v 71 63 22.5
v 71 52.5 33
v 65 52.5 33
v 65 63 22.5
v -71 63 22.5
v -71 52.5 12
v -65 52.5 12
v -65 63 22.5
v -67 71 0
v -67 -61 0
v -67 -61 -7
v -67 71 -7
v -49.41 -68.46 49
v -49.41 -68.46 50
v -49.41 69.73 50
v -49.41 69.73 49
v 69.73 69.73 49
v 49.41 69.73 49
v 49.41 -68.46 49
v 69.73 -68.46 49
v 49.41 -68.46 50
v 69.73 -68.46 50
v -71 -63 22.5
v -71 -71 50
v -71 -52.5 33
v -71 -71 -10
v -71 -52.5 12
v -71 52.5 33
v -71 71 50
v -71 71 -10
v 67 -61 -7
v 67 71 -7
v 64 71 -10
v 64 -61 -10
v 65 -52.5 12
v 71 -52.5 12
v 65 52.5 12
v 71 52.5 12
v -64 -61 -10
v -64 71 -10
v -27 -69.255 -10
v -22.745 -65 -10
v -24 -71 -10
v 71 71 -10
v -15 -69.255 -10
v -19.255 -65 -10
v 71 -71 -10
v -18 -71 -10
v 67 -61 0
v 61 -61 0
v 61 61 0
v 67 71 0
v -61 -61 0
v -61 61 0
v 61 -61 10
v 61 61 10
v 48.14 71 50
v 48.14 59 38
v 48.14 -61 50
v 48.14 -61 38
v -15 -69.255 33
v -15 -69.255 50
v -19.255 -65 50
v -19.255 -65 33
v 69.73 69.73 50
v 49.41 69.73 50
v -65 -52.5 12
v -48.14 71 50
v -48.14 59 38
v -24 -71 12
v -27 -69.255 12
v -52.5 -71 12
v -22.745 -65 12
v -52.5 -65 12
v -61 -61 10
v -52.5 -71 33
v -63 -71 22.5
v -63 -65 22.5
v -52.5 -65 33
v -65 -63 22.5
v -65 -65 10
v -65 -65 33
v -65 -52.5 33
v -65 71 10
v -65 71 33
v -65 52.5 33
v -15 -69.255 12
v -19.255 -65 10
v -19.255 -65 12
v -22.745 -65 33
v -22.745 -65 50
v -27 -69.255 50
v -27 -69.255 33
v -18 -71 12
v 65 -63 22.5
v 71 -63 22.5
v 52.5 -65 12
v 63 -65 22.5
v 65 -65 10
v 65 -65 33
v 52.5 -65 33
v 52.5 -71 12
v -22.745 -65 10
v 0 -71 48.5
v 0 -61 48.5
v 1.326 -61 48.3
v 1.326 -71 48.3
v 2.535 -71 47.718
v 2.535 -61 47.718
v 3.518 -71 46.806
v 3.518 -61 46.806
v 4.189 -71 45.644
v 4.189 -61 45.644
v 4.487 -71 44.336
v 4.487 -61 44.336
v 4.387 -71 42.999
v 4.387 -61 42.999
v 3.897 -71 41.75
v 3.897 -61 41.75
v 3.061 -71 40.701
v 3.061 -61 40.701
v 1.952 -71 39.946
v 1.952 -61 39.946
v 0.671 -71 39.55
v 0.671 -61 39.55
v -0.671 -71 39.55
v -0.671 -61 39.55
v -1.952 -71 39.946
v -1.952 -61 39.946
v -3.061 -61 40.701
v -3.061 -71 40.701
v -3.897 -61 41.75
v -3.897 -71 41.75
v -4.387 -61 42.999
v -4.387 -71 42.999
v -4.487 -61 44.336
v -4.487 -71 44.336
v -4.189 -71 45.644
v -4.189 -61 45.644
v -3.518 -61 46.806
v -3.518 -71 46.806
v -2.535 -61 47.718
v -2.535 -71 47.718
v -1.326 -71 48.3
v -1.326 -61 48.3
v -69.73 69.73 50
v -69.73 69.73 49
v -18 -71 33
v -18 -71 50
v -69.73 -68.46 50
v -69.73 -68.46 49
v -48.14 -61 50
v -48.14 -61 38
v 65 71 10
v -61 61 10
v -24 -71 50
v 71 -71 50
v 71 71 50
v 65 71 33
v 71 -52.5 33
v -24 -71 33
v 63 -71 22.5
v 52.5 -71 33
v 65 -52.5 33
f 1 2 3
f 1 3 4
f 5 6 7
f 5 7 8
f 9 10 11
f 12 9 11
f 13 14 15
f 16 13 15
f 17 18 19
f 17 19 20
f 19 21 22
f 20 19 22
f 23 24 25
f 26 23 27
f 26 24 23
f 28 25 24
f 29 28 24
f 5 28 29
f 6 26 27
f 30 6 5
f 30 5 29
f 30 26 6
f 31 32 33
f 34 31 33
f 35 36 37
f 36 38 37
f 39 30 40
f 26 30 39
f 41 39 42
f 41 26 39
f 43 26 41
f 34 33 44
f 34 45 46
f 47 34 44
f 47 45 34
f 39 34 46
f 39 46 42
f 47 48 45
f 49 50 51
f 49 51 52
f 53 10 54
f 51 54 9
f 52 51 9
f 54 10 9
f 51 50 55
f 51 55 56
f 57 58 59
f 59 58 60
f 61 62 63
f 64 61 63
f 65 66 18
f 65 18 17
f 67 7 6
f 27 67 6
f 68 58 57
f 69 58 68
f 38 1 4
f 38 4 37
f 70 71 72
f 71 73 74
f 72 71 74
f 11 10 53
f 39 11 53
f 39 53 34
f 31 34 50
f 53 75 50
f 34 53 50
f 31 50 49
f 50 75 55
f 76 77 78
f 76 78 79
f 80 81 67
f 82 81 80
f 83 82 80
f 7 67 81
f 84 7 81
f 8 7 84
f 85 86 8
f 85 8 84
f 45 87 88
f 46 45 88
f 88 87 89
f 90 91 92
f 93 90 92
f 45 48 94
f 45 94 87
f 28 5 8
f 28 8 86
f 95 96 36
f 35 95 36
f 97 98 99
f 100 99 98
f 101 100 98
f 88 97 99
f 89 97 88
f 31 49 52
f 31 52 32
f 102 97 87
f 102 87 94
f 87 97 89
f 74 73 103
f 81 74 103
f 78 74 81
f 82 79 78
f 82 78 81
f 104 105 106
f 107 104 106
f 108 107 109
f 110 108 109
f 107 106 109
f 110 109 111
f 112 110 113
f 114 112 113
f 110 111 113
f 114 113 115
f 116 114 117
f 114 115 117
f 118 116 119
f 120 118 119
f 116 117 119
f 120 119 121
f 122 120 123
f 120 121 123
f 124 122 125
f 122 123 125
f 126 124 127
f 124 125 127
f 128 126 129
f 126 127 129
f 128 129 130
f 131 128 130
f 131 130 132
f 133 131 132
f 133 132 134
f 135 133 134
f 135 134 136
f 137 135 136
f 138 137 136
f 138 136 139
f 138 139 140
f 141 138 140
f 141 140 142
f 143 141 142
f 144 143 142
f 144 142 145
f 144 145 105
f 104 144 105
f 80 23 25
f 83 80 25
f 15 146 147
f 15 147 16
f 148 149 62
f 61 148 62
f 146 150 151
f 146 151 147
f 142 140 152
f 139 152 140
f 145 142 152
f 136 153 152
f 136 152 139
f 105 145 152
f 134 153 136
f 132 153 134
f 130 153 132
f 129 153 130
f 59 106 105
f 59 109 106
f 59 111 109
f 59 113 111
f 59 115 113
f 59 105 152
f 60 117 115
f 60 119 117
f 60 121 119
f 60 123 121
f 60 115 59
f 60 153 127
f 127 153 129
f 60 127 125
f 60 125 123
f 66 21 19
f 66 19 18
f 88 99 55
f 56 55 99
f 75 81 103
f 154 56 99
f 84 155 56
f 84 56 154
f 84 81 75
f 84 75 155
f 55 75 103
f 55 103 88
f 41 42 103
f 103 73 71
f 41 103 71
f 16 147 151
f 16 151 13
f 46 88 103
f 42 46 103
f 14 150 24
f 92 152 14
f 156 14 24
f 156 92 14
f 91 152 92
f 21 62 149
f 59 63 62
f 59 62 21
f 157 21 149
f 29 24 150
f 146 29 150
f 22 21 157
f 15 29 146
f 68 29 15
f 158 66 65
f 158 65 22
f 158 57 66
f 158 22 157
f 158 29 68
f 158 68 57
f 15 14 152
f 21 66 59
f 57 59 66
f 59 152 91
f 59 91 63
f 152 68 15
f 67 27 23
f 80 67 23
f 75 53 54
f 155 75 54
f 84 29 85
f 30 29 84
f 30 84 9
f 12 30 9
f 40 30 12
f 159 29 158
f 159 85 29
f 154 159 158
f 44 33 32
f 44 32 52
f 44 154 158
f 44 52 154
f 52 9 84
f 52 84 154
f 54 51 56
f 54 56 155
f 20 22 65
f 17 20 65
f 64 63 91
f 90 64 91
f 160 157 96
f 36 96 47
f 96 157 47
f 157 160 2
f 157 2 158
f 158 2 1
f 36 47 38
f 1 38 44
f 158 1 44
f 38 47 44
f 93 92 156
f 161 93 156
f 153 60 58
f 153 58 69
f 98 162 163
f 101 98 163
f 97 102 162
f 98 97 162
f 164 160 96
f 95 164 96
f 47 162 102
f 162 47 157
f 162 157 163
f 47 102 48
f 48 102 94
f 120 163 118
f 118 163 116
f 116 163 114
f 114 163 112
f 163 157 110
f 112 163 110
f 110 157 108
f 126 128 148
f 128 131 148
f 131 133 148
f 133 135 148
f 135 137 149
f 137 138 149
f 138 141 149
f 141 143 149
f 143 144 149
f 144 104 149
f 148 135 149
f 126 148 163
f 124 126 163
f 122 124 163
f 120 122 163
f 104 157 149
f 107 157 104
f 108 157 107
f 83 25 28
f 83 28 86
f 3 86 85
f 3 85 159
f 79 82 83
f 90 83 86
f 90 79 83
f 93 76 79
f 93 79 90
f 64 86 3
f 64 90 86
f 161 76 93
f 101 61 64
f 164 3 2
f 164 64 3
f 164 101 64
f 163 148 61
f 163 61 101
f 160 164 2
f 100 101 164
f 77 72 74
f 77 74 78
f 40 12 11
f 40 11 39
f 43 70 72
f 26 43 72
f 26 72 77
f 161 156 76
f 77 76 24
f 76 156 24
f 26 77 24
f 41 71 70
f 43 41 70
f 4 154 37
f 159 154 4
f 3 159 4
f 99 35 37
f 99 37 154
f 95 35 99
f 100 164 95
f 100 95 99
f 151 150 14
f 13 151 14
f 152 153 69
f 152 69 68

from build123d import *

# Parameters (mm, degrees)
SKETCH1_W            = 142
SKETCH1_H            = 142
SKETCH1_W_2          = 122
SKETCH1_H_2          = 122
BOSS_EXTRUDE1_DEPTH  = 10
SKETCH2_W            = 142
SKETCH2_H            = 10
BOSS_EXTRUDE2_DEPTH  = 10
BOSS_EXTRUDE3_DEPTH  = 132
BOSS_EXTRUDE4_DEPTH  = 2
SKETCH6_W            = 6
SKETCH6_H            = 8
BOSS_EXTRUDE5_DEPTH  = 21
BOSS_EXTRUDE6_DEPTH  = 142
BOSS_EXTRUDE7_DEPTH  = 6
BOSS_EXTRUDE8_DEPTH  = 6
SKETCH10_W           = 142
SKETCH10_H           = 142
BOSS_EXTRUDE9_DEPTH  = 12
BOSS_EXTRUDE14_DEPTH = 6
SKETCH13_R           = 4.5
CUT_EXTRUDE2_DEPTH   = 159.003164525
SKETCH14_W           = 20.32
SKETCH14_H           = 138.19
CUT_EXTRUDE3_DEPTH   = 1
CHAMFER4_SIZE        = 12
CUT_EXTRUDE4_DEPTH   = 117.970081645


with BuildPart() as part:
    # Sketch1 → Boss-Extrude1 (new body)
    with BuildSketch(Plane(origin=(0, 0, 0), x_dir=(0, 1, 0), z_dir=(0, 0, 1))):
        Rectangle(SKETCH1_W, SKETCH1_H)
        Rectangle(SKETCH1_W_2, SKETCH1_H_2, mode=Mode.SUBTRACT)
    extrude(amount=BOSS_EXTRUDE1_DEPTH)

    # Sketch2 → Boss-Extrude2 (add)
    with BuildSketch(Plane(origin=(0, 0, 0), x_dir=(1, 0, 0), z_dir=(0, 0, -1))):
        with Locations((0, 66)):
            Rectangle(SKETCH2_W, SKETCH2_H)
    extrude(amount=BOSS_EXTRUDE2_DEPTH)

    # Sketch3 → Boss-Extrude3 (add)
    with BuildSketch(Plane(origin=(0, -61, 0), x_dir=(-1, 0, 0), z_dir=(0, 1, 0))):
        Polygon((-67, -7), (-64, -10), (-71, -10), (-71, 0), (-67, 0), align=None)
        Polygon((64, -10), (71, -10), (71, 0), (67, 0), (67, -7), align=None)
    extrude(amount=BOSS_EXTRUDE3_DEPTH)

    # Sketch5 → Boss-Extrude4 (add)
    with BuildSketch(Plane.XY.offset(10)):
        Polygon((-65, -65), (65, -65), (65, 65), (65, 71), (71, 71), (71, 65), (71, -71), (-71, -71), (-71, 71), (-65, 71), (-65, 65), align=None)
    extrude(amount=BOSS_EXTRUDE4_DEPTH)

    # Sketch6 → Boss-Extrude5 (add)
    with BuildSketch(Plane.XY.offset(12)):
        with Locations((-68, 67)):
            Rectangle(SKETCH6_W, SKETCH6_H)
        Polygon((-65, -65), (-65, -63), (-71, -63), (-71, -71), (-63, -71), (-63, -65), align=None)
        Polygon((63, -71), (63, -65), (65, -65), (65, -63), (71, -63), (71, -71), align=None)
        with Locations((68, 67)):
            Rectangle(SKETCH6_W, SKETCH6_H)
    extrude(amount=BOSS_EXTRUDE5_DEPTH)

    # Sketch7 → Boss-Extrude6 (add)
    with BuildSketch(Plane.XZ.offset(71)):
        Polygon((-63, 33), (63, 33), (71, 33), (71, 38), (-71, 38), (-71, 33), align=None)
    extrude(amount=-BOSS_EXTRUDE6_DEPTH)

    # Sketch8 → Boss-Extrude7 (add)
    with BuildSketch(Plane.YZ.offset(71)):
        Polygon((63, 12), (63, 22.5), (52.5, 12), align=None)
        Polygon((52.5, 33), (63, 22.5), (63, 33), align=None)
    boss_extrude7 = extrude(amount=-BOSS_EXTRUDE7_DEPTH)

    # Sketch9 → Boss-Extrude8 (add)
    with BuildSketch(Plane(origin=(-71, 0, 0), x_dir=(0, -1, 0), z_dir=(-1, 0, 0))):
        Polygon((-52.5, 12), (-63, 22.5), (-63, 12), align=None)
        Polygon((-52.5, 33), (-63, 33), (-63, 22.5), align=None)
    boss_extrude8 = extrude(amount=-BOSS_EXTRUDE8_DEPTH)

    # Mirror4: Boss-Extrude7, Boss-Extrude8 across plane
    add(boss_extrude7.mirror(Plane.ZX))
    add(boss_extrude8.mirror(Plane.ZX))

    # Sketch10 → Boss-Extrude9 (add)
    with BuildSketch(Plane.XY.offset(38)):
        Rectangle(SKETCH10_W, SKETCH10_H)
        Polygon((-48.14, 59), (-48.14, -48.14), (-48.14, -61), (48.14, -61), (48.14, -48.14), (48.14, 59), align=None, mode=Mode.SUBTRACT)
    extrude(amount=BOSS_EXTRUDE9_DEPTH)

    # Sketch11 → Boss-Extrude14 (add)
    with BuildSketch(Plane.XZ.offset(71)):
        Polygon((-52.5, 12), (-63, 22.5), (-63, 12), align=None)
        Polygon((-63, 33), (-63, 22.5), (-52.5, 33), align=None)
    boss_extrude14 = extrude(amount=-BOSS_EXTRUDE14_DEPTH)

    # Mirror5: Boss-Extrude14 across plane
    add(boss_extrude14.mirror(Plane(origin=(0, 0, 0), x_dir=(0, 0, 1), z_dir=(1, 0, 0))))

    # Sketch13 → Cut-Extrude2 (cut, through all)
    with BuildSketch(Plane(origin=(0, -61, 0), x_dir=(-1, 0, 0), z_dir=(0, 1, 0))):
        with Locations(Location((0, 44, 0), (0, 0, 90))):
            Circle(SKETCH13_R)
    extrude(amount=-CUT_EXTRUDE2_DEPTH, mode=Mode.SUBTRACT)

    # Sketch14 → Cut-Extrude3 (cut)
    with BuildSketch(Plane.XY.offset(50)):
        with Locations((-59.57, 0.635)):
            Rectangle(SKETCH14_W, SKETCH14_H)
        with Locations((59.57, 0.635)):
            Rectangle(SKETCH14_W, SKETCH14_H)
    extrude(amount=-CUT_EXTRUDE3_DEPTH, mode=Mode.SUBTRACT)

    # Chamfer4
    chamfer4_edges = [part.edges().sort_by_distance(p)[0] for p in [
        (0, 59, 50),
    ]]
    chamfer(chamfer4_edges, length=CHAMFER4_SIZE - 0.0001)  # a hair under: the kernel refuses the full size

    # Sketch15 → Cut-Extrude4 (cut, through all)
    with BuildSketch(Plane.XY.offset(50)):
        Polygon((-24, -71), (-18, -71), (-15, -69.254896882), (-19.254896882, -65), (-22.745103118, -65), (-27, -69.254896882), align=None)
    extrude(amount=-CUT_EXTRUDE4_DEPTH, mode=Mode.SUBTRACT)


solid = part.part
